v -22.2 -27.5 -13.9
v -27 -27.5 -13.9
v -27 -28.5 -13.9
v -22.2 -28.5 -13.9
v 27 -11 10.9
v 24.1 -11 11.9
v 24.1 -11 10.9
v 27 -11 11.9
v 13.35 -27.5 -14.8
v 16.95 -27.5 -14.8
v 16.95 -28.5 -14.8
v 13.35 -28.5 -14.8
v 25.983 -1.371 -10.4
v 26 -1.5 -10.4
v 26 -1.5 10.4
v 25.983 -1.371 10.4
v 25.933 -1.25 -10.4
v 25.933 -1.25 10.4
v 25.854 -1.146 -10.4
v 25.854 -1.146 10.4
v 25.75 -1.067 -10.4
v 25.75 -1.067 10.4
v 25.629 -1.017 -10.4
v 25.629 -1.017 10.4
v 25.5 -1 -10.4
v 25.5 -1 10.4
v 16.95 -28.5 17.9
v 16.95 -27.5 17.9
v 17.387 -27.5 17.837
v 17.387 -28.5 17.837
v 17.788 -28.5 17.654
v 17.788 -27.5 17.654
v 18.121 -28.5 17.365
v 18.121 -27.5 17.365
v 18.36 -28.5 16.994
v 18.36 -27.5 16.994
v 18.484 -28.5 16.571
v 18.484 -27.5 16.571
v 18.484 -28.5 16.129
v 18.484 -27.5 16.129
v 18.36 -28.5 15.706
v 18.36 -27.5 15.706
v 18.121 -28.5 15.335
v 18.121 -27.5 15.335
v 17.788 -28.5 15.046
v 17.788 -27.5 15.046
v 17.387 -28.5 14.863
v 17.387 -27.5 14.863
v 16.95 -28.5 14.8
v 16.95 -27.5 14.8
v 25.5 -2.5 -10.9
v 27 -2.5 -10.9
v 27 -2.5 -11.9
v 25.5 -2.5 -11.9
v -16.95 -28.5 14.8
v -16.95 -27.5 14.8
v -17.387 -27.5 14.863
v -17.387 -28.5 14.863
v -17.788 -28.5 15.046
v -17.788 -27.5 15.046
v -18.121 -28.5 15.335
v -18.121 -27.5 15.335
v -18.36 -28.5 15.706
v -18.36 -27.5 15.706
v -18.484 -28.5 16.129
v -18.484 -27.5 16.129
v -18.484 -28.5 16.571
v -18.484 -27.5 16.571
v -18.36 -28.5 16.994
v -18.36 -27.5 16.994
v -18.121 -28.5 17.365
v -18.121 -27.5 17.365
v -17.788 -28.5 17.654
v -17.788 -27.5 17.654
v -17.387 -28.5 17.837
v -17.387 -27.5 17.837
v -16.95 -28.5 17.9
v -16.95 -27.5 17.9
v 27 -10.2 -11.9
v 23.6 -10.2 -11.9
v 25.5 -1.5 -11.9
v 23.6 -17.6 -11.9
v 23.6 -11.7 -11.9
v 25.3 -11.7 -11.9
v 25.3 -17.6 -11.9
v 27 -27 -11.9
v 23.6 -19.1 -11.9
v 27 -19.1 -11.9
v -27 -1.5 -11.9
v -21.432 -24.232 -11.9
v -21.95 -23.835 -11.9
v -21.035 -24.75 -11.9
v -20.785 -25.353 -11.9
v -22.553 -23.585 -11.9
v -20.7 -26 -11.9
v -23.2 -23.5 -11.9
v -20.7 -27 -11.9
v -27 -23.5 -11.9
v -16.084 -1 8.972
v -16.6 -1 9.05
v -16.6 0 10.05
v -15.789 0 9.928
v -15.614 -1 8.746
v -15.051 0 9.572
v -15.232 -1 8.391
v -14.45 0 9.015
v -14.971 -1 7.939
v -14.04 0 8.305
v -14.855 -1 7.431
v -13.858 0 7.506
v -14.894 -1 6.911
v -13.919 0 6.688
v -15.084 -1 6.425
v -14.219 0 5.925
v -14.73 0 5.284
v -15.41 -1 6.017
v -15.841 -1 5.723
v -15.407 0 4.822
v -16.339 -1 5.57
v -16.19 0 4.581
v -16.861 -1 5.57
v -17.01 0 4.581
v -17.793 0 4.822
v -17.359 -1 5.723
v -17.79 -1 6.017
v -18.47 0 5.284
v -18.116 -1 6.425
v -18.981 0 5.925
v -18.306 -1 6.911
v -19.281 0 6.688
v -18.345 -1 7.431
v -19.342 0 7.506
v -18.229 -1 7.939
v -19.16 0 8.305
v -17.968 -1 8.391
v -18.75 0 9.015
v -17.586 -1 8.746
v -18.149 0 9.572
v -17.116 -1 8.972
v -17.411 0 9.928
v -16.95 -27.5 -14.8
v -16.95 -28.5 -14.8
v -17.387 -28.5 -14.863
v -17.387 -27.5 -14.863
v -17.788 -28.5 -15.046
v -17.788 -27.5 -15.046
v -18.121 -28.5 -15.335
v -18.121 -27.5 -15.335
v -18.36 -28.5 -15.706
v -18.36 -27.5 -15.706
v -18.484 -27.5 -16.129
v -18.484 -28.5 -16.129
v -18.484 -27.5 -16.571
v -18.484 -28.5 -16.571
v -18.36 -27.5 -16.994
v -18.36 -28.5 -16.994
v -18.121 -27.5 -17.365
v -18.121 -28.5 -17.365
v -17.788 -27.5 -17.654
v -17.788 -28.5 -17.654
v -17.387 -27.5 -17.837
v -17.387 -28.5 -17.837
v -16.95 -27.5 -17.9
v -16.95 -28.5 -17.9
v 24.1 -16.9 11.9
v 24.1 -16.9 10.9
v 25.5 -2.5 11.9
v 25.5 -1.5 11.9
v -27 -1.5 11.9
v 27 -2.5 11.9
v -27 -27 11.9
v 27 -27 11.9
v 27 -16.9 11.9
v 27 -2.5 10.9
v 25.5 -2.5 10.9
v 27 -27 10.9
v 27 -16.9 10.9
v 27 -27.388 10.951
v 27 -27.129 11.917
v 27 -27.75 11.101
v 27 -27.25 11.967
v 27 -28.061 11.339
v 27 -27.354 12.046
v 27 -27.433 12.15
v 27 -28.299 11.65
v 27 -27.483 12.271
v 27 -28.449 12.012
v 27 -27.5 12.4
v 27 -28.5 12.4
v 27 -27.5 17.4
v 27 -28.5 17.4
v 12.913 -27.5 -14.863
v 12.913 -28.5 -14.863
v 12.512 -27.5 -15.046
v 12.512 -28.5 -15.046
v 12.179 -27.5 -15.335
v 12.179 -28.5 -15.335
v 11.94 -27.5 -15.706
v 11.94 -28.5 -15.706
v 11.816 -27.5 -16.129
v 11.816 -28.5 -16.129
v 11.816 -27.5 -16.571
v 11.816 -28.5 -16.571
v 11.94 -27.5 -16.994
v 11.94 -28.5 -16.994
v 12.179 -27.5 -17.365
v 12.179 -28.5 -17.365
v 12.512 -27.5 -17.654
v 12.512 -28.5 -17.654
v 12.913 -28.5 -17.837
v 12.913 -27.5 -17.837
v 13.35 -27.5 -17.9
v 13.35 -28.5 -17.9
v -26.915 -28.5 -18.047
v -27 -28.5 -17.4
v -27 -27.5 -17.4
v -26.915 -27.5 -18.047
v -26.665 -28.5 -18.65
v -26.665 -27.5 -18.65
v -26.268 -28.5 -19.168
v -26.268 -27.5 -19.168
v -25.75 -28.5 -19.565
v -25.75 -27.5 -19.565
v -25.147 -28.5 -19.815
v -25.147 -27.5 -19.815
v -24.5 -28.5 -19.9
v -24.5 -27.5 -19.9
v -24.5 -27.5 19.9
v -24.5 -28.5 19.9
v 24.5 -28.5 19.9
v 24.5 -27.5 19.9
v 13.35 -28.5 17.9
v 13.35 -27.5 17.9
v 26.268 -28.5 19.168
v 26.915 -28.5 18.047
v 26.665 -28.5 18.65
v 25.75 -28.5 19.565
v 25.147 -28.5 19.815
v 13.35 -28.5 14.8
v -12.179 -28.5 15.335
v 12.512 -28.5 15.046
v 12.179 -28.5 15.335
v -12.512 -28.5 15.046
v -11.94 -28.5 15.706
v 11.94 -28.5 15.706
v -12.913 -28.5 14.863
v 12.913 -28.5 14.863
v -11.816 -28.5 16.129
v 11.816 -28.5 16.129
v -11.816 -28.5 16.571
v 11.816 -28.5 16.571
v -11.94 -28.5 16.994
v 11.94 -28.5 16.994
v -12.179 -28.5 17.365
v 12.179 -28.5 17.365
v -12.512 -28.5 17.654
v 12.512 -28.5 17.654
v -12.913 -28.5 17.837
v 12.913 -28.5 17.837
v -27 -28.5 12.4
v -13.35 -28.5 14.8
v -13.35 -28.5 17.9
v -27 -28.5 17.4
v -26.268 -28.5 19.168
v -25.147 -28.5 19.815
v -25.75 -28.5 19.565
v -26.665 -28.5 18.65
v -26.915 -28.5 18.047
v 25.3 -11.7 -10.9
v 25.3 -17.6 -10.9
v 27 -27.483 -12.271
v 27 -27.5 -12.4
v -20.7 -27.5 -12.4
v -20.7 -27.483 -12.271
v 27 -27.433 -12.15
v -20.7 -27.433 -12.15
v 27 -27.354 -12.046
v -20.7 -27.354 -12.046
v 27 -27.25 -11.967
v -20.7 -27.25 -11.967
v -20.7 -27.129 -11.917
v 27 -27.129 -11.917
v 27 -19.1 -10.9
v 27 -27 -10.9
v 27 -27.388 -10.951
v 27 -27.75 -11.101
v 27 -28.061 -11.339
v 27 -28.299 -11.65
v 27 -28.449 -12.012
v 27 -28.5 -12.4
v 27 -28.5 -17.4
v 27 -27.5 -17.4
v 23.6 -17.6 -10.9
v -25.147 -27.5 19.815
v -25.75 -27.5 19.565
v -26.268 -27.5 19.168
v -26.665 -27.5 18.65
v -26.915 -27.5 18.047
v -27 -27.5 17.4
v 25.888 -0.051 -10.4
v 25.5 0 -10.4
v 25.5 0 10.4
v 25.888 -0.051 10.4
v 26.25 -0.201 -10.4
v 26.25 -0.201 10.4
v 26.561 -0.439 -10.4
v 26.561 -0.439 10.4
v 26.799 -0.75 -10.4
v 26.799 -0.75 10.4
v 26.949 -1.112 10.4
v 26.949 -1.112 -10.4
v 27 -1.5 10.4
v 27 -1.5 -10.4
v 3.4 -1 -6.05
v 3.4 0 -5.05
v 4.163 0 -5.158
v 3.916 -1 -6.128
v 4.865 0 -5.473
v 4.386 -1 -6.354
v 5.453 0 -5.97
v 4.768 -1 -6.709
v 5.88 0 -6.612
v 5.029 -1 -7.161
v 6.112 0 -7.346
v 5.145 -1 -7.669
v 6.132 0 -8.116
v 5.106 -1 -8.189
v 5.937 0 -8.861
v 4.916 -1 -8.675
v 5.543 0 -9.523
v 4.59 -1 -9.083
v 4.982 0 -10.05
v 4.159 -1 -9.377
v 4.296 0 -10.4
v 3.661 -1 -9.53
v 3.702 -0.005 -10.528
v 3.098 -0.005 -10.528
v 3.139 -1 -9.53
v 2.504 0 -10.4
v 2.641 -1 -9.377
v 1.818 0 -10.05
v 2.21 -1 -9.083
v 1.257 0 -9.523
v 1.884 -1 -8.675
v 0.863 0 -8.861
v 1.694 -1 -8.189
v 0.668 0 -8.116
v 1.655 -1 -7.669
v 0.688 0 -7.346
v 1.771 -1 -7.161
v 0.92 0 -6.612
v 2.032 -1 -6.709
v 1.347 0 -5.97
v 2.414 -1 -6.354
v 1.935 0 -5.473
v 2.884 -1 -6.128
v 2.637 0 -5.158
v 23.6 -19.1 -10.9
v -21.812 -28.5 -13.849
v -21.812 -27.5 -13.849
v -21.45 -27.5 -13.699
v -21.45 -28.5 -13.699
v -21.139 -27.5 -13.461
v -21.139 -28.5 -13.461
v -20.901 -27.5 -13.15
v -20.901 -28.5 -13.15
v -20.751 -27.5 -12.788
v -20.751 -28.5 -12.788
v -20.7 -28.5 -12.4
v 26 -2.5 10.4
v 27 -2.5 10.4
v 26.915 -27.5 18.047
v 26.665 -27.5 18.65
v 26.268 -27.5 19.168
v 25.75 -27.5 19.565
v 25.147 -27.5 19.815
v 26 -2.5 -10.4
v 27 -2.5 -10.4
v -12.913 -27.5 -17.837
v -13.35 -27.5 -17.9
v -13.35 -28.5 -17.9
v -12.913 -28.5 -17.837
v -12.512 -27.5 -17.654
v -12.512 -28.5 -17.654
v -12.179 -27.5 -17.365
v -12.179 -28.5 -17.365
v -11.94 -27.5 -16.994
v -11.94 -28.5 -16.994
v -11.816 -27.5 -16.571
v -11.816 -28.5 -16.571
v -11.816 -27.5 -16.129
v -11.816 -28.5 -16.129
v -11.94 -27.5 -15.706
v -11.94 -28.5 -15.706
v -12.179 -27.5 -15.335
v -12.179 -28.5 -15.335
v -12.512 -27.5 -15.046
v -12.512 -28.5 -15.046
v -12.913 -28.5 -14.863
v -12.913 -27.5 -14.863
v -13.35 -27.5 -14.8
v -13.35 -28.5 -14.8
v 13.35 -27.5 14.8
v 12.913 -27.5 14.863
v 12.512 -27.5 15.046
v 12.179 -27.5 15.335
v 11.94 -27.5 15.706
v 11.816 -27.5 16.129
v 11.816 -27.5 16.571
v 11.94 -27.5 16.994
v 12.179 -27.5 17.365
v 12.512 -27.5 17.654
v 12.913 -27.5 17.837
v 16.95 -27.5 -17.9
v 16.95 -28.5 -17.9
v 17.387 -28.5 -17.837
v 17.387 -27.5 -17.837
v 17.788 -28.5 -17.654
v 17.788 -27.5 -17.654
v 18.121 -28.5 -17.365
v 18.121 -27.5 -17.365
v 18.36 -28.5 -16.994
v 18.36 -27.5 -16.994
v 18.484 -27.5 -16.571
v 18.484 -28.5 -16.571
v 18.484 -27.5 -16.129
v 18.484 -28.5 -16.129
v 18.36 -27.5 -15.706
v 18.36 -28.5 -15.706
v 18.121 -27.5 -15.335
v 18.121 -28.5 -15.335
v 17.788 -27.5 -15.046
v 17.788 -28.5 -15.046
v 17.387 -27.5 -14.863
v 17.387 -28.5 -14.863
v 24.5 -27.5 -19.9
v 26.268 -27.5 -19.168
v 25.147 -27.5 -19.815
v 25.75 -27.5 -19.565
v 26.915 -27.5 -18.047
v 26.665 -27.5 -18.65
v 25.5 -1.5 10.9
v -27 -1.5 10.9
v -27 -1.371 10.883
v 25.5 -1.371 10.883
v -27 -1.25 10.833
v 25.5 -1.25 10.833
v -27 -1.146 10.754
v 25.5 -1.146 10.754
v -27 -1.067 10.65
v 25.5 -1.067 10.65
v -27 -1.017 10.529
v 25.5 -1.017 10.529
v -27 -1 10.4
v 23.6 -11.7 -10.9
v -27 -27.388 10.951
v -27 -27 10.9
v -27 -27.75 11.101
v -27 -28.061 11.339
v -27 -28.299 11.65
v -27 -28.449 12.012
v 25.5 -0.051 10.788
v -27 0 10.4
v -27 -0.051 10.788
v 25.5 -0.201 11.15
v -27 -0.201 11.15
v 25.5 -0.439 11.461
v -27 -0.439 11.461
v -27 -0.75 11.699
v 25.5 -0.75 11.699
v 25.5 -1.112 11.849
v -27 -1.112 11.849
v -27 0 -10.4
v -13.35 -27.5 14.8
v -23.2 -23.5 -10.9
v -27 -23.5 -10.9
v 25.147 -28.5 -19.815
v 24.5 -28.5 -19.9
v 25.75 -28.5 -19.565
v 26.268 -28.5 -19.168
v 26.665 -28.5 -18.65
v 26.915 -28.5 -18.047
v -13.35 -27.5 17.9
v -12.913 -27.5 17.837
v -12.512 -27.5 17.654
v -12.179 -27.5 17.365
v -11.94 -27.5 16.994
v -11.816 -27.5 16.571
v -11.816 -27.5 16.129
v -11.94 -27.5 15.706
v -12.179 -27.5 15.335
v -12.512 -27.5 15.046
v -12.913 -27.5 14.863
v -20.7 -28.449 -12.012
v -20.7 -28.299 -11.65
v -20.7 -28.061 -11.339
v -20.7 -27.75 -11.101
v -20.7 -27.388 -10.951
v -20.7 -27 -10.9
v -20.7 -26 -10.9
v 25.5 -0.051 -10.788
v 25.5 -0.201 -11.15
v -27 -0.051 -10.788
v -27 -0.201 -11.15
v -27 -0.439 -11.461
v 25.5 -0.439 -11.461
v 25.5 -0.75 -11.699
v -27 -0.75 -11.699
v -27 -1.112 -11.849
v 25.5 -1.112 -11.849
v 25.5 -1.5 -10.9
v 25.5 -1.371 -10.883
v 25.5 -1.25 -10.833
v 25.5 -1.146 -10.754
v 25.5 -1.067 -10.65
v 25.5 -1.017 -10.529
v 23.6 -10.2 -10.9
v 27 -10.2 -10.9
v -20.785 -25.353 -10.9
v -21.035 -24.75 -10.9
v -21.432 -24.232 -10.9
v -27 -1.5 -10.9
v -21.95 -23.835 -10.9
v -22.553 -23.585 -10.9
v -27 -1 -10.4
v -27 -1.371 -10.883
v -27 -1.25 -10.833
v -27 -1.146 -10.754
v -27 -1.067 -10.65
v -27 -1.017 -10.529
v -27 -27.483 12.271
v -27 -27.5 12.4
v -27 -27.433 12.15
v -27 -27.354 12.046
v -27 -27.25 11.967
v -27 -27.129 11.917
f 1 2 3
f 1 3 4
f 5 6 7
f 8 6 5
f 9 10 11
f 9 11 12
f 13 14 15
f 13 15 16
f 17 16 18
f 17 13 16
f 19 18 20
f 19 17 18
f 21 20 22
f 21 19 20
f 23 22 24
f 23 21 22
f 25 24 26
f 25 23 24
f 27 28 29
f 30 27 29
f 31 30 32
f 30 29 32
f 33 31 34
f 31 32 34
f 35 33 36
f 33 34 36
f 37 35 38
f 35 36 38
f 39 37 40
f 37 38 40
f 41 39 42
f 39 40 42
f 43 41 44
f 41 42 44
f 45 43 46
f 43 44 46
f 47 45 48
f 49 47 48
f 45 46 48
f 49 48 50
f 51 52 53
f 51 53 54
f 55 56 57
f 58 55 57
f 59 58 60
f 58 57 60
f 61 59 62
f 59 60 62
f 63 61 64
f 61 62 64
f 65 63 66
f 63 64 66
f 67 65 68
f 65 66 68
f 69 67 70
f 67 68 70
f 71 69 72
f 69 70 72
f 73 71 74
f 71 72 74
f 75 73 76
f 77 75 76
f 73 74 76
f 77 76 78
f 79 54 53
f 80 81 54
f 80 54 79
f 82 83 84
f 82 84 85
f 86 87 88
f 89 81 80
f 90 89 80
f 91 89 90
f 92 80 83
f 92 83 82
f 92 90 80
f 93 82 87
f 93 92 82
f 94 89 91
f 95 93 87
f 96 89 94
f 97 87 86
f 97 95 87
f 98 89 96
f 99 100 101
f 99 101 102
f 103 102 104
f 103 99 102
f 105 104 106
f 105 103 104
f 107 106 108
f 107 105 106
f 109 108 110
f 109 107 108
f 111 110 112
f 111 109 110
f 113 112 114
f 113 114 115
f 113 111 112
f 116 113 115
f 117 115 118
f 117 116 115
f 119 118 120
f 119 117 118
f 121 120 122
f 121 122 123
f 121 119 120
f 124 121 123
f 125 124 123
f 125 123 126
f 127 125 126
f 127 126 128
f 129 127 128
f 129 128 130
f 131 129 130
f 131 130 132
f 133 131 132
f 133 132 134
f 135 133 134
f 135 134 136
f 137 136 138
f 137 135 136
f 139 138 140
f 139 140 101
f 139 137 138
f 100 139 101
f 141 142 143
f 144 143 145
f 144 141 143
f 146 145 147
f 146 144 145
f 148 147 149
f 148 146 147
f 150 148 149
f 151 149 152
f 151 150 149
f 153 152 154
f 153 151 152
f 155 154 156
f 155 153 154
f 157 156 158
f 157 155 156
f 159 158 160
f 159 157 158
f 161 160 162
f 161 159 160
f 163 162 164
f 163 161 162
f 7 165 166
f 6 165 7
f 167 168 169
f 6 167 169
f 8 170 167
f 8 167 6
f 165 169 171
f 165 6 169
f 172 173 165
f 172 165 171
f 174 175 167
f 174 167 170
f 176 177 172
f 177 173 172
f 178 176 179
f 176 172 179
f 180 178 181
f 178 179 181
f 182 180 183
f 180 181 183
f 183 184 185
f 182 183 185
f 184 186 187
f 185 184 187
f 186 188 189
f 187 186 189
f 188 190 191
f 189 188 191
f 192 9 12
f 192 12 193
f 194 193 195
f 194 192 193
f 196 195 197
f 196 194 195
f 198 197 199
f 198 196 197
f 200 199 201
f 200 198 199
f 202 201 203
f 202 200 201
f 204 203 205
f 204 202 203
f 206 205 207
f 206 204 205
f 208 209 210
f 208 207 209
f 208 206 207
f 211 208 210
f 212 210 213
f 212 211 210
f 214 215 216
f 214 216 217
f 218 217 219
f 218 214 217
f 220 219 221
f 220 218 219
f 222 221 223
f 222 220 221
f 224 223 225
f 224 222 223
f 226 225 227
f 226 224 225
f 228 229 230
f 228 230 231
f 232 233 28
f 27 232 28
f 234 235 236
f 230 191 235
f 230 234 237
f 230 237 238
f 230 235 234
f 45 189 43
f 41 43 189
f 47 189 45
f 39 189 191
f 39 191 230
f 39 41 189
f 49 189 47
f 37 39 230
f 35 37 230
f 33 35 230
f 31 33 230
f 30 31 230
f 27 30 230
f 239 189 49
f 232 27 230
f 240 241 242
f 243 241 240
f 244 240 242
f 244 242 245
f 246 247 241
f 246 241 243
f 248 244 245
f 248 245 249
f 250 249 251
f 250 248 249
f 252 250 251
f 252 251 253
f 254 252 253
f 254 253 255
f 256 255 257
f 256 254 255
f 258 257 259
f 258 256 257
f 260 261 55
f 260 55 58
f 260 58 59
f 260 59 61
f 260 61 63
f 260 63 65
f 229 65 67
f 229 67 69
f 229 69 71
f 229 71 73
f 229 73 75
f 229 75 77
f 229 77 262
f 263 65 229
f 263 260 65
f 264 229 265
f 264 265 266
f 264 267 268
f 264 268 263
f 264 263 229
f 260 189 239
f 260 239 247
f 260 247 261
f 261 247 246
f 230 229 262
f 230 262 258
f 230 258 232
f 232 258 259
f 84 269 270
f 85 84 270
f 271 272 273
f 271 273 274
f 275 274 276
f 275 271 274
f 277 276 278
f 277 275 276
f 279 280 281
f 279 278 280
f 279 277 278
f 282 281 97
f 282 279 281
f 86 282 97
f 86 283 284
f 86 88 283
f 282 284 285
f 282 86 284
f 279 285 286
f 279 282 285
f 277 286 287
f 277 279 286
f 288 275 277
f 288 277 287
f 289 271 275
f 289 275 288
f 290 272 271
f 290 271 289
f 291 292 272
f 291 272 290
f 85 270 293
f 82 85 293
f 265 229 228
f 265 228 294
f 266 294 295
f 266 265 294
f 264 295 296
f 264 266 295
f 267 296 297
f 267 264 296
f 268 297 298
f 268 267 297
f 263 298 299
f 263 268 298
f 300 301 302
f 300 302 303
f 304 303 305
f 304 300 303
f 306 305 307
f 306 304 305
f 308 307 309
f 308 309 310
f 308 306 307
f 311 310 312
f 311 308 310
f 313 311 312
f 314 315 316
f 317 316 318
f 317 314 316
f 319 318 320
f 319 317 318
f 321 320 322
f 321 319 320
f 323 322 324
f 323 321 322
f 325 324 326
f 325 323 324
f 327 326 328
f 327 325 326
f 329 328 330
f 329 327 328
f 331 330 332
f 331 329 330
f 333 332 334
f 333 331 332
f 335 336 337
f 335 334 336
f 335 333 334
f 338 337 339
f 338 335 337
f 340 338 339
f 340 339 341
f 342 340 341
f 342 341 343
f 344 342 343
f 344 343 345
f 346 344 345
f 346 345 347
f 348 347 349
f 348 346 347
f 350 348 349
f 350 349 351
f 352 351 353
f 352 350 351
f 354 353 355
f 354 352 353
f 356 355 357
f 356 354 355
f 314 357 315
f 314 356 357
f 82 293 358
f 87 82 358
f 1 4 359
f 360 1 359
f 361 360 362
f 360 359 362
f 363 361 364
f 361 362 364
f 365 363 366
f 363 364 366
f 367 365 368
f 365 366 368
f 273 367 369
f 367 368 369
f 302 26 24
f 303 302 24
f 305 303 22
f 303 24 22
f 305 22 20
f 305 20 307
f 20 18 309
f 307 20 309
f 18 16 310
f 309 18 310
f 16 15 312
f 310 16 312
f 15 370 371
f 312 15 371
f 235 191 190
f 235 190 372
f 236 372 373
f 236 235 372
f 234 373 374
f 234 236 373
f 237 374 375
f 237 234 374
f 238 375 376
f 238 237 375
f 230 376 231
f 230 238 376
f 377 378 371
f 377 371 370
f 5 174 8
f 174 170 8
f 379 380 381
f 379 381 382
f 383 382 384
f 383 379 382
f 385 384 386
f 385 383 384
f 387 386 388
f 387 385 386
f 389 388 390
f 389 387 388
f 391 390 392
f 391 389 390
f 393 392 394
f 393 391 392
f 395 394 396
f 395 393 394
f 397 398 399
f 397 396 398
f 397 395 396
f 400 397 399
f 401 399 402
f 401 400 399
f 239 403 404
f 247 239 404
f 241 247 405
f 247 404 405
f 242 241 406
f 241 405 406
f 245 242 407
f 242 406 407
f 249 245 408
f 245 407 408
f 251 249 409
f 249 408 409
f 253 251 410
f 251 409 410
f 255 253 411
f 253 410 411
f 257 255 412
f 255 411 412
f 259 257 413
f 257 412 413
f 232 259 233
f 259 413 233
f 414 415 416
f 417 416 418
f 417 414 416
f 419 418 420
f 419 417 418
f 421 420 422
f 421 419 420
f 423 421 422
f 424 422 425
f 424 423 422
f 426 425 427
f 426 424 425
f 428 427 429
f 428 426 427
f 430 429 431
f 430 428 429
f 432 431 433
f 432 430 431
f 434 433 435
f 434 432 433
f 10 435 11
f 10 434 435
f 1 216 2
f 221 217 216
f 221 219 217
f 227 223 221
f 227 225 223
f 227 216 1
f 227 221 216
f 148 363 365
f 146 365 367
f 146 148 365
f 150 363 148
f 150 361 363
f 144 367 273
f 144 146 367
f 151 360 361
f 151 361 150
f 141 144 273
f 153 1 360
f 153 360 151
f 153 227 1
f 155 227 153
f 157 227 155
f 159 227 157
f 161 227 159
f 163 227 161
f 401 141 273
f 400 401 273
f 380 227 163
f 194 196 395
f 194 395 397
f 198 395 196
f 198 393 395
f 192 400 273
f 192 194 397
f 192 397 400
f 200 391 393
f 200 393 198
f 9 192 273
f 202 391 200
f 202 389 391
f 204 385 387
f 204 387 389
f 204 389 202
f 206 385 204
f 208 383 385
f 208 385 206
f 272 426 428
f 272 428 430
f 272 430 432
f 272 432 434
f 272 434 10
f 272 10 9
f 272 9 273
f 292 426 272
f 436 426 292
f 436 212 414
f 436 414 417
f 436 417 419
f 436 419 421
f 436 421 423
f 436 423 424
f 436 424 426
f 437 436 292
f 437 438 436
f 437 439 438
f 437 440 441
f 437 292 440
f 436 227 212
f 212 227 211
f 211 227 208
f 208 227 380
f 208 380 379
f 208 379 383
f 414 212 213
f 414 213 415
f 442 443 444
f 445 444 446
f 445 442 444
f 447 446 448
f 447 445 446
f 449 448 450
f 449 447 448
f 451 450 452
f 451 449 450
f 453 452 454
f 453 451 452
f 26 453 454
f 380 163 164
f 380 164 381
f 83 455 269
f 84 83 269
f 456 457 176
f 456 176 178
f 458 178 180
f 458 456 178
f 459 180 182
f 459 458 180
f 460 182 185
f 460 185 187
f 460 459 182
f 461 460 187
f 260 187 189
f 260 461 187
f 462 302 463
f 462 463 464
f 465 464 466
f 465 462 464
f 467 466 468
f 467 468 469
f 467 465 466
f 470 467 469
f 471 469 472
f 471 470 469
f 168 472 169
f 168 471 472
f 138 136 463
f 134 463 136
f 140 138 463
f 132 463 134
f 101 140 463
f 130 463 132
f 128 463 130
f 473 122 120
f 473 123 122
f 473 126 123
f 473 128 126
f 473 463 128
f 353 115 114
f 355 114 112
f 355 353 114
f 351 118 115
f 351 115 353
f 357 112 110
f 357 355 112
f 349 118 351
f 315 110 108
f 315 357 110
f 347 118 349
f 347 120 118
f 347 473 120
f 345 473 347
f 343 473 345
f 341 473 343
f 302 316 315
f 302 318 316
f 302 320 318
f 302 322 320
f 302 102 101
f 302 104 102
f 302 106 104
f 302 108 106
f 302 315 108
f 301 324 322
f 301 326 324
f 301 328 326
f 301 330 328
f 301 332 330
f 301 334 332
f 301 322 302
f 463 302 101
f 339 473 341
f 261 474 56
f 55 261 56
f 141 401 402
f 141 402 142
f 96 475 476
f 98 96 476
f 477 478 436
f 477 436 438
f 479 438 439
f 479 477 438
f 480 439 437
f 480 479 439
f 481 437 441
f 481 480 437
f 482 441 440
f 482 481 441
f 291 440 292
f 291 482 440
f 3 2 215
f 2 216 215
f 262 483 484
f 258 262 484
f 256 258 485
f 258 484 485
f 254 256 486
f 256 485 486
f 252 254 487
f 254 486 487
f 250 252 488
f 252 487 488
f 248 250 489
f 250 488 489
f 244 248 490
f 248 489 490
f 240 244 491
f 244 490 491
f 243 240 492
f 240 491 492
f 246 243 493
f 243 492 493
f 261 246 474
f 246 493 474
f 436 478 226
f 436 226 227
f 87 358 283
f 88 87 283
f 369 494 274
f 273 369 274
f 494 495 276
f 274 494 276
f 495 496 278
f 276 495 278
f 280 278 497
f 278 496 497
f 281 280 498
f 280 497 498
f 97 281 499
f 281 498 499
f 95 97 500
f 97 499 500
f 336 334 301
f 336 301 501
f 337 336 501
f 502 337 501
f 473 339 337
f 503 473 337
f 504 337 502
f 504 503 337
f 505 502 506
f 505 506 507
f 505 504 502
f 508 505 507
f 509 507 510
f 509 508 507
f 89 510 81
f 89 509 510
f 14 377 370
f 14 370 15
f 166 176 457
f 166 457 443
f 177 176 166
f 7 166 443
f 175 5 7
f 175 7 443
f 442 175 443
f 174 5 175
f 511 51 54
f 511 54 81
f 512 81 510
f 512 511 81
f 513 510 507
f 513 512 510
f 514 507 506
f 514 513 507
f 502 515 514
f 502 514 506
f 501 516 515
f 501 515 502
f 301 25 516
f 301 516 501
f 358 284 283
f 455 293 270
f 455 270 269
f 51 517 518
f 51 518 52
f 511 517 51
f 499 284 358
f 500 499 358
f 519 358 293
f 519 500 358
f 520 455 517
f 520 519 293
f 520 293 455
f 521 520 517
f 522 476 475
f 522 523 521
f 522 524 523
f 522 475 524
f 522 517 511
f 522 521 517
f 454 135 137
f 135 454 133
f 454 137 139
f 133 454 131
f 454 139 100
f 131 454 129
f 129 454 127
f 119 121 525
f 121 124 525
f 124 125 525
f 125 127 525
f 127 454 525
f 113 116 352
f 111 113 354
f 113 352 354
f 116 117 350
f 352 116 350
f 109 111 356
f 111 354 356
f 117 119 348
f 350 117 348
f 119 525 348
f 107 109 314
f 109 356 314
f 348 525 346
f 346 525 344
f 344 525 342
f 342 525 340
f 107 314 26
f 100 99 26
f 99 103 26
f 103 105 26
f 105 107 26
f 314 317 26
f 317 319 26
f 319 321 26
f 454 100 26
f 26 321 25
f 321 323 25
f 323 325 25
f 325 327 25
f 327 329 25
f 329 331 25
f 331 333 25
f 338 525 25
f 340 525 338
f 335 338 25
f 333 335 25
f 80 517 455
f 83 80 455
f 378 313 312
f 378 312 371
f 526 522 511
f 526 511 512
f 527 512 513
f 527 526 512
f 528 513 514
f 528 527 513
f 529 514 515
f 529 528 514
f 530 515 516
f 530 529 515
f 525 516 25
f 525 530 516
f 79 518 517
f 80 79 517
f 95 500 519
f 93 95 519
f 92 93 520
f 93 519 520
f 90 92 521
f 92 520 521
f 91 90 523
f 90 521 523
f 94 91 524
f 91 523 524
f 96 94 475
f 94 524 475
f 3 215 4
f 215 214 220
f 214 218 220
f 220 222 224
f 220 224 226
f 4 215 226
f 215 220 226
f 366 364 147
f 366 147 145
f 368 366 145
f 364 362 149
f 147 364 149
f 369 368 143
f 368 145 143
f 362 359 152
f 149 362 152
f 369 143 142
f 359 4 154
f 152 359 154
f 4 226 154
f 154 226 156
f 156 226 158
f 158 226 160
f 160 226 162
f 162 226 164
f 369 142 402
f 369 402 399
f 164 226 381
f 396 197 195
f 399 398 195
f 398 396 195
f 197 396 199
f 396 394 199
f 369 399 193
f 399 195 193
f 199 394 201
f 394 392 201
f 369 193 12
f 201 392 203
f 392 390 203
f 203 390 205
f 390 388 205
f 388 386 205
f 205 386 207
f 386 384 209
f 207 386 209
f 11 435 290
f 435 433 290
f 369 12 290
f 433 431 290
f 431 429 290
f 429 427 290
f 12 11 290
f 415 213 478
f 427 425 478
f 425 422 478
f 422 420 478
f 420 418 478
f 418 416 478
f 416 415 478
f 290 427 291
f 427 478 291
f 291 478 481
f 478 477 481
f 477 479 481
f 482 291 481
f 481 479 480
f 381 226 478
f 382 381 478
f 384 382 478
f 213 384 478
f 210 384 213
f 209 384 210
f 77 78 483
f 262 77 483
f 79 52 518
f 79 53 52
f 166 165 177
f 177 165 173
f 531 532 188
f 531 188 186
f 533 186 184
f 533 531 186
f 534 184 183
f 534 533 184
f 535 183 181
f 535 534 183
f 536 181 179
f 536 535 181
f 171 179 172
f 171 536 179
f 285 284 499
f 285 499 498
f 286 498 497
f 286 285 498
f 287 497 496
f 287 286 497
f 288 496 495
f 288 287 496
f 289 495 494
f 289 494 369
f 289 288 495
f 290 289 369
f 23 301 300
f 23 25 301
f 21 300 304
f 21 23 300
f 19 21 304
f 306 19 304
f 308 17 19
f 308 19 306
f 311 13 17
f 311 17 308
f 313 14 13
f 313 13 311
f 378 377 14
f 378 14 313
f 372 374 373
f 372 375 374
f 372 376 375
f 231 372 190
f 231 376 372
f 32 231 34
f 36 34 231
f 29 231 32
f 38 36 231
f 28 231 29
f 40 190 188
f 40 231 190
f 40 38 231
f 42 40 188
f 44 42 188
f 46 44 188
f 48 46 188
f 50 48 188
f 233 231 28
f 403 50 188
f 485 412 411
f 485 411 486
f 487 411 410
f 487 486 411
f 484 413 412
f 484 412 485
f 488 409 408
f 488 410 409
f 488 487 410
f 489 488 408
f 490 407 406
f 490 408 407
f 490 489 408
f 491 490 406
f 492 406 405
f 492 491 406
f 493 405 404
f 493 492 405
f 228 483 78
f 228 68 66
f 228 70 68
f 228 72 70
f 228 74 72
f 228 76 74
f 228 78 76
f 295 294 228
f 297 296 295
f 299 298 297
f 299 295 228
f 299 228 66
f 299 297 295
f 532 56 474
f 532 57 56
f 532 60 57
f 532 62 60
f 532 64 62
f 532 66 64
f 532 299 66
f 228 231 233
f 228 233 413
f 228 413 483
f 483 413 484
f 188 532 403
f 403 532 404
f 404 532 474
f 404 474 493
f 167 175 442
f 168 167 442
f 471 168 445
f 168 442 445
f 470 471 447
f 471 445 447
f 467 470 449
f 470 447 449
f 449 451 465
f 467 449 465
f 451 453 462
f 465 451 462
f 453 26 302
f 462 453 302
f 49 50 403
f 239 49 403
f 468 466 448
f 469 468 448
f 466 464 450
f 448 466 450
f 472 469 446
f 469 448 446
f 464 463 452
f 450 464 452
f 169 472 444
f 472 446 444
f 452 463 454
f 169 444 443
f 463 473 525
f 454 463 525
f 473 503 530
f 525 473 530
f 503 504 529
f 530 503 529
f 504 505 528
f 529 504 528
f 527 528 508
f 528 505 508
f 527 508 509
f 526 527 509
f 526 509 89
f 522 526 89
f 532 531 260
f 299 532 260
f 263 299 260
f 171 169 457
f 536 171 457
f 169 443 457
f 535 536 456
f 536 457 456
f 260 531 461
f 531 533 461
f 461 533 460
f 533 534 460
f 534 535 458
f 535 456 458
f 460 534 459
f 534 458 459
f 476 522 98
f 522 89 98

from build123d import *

# Parameters (mm, degrees)
SKETCH1_W                      = 54
SKETCH1_H                      = 23.8
BASE_FLANGE1_DEPTH             = 1
EDGE_FLANGE1_STRIP_W           = 5
EDGE_FLANGE1_STRIP_H           = 1
EDGE_FLANGE1_STRIP_CUT_DEPTH   = 54
EDGE_FLANGE1_STRIP_2_W         = 5
EDGE_FLANGE1_STRIP_2_H         = 1
EDGE_FLANGE1_STRIP_CUT_2_DEPTH = 54
EDGE_FLANGE1_DEPTH             = 54
EDGE_FLANGE1_BEND_DEPTH        = 54
EDGE_FLANGE2_STRIP_W           = 5
EDGE_FLANGE2_STRIP_H           = 1
EDGE_FLANGE2_STRIP_CUT_DEPTH   = 20.8
EDGE_FLANGE2_DEPTH             = 20.8
CUT_EXTRUDE1_START             = -1.5
CUT_EXTRUDE1_DEPTH             = 1.5
CUT_EXTRUDE2_START             = -1.5
CUT_EXTRUDE2_DEPTH             = 1.5
EDGE_FLANGE3_STRIP_W           = 5
EDGE_FLANGE3_STRIP_H           = 1
EDGE_FLANGE3_STRIP_CUT_DEPTH   = 54
EDGE_FLANGE3_STRIP_2_W         = 5
EDGE_FLANGE3_STRIP_2_H         = 1
EDGE_FLANGE3_STRIP_CUT_2_DEPTH = 54
EDGE_FLANGE3_DEPTH             = 54
EDGE_FLANGE3_BEND_DEPTH        = 54
BREAK_CORNER1_START            = -28.5
BREAK_CORNER1_DEPTH            = 1
CUT_EXTRUDE3_DEPTH             = 10
CUT_EXTRUDE4_DEPTH             = 2
CUT_EXTRUDE4_DEPTH_BACK        = 2
BREAK_CORNER2_START            = -28.5
BREAK_CORNER2_DEPTH            = 1
CUT_EXTRUDE5_DEPTH             = 1
SKETCH26_W                     = 2.9
SKETCH26_H                     = 5.9
CUT_EXTRUDE6_DEPTH             = 1
SKETCH27_R                     = 1.6
CUT_EXTRUDE7_DEPTH             = 1
MOVE_FACE1_BY                  = 0.15
MOVE_FACE1_2_BY                = 0.15
CHAMFER1_SIZE                  = 1
CHAMFER2_SIZE                  = 1


# Read off the part's stored shape, not the designer's step: Break-Corner1, Break-Corner2
# Sheet-metal steps are written as plain solids
# Some blends are built 0.0001 mm under size
with BuildPart() as part:
    # Sketch1 → Base-Flange1 (new body)
    with BuildSketch(Plane(origin=(0, 0, 0), x_dir=(1, 0, 0), z_dir=(0, 1, 0))):
        Rectangle(SKETCH1_W, SKETCH1_H)
    extrude(amount=-BASE_FLANGE1_DEPTH)

    # Edge-Flange1 strip (across the edge) → Edge-Flange1 strip cut (cut)
    with BuildSketch(Plane(origin=(27, -1, 11.9), x_dir=(0, 0, -1), z_dir=(-1, 0, 0))):
        with Locations((-1, -0.5)):
            Rectangle(EDGE_FLANGE1_STRIP_W, EDGE_FLANGE1_STRIP_H)
    extrude(amount=EDGE_FLANGE1_STRIP_CUT_DEPTH, mode=Mode.SUBTRACT)

    # Edge-Flange1 strip 2 (across the edge) → Edge-Flange1 strip cut 2 (cut)
    with BuildSketch(Plane(origin=(-27, -1, -11.9), x_dir=(0, 0, 1), z_dir=(1, 0, 0))):
        with Locations((-1, -0.5)):
            Rectangle(EDGE_FLANGE1_STRIP_2_W, EDGE_FLANGE1_STRIP_2_H)
    extrude(amount=EDGE_FLANGE1_STRIP_CUT_2_DEPTH, mode=Mode.SUBTRACT)

    # Edge-Flange1 section (across the edge) → Edge-Flange1 (add)
    with BuildSketch(Plane(origin=(27, -1, 11.9), x_dir=(0, 0, -1), z_dir=(-1, 0, 0))):
        with BuildLine():
            Line((0, 0.5), (0, 27.5))
            Line((0, 27.5), (1, 27.5))
            Line((1, 27.5), (1, 0.5))
            ThreePointArc((1, 0.5), (1.146446609, 0.146446609), (1.5, 0))
            Line((1.5, 0), (1.5, -1))
            ThreePointArc((1.5, -1), (0.439339828, -0.560660172), (0, 0.5))
        make_face()
    extrude(amount=EDGE_FLANGE1_DEPTH)

    # Edge-Flange1 section 2 (across the edge) → Edge-Flange1 bend (add)
    with BuildSketch(Plane(origin=(-27, -1, -11.9), x_dir=(0, 0, 1), z_dir=(1, 0, 0))):
        with BuildLine():
            Line((0, 0.5), (0, 27.5))
            Line((0, 27.5), (1, 27.5))
            Line((1, 27.5), (1, 0.5))
            ThreePointArc((1, 0.5), (1.146446609, 0.146446609), (1.5, 0))
            Line((1.5, 0), (1.5, -1))
            ThreePointArc((1.5, -1), (0.439339828, -0.560660172), (0, 0.5))
        make_face()
    extrude(amount=EDGE_FLANGE1_BEND_DEPTH)

    # Edge-Flange2 strip (across the edge) → Edge-Flange2 strip cut (cut)
    with BuildSketch(Plane(origin=(27, -1, -10.4), x_dir=(-1, 0, 0), z_dir=(0, 0, 1))):
        with Locations((-1, -0.5)):
            Rectangle(EDGE_FLANGE2_STRIP_W, EDGE_FLANGE2_STRIP_H)
    extrude(amount=EDGE_FLANGE2_STRIP_CUT_DEPTH, mode=Mode.SUBTRACT)

    # Edge-Flange2 section (across the edge) → Edge-Flange2 (add)
    with BuildSketch(Plane(origin=(27, -1, -10.4), x_dir=(-1, 0, 0), z_dir=(0, 0, 1))):
        with BuildLine():
            Line((0, 0.5), (0, 1.5))
            Line((0, 1.5), (1, 1.5))
            Line((1, 1.5), (1, 0.5))
            ThreePointArc((1, 0.5), (1.146446609, 0.146446609), (1.5, 0))
            Line((1.5, 0), (1.5, -1))
            ThreePointArc((1.5, -1), (0.439339828, -0.560660172), (0, 0.5))
        make_face()
    extrude(amount=EDGE_FLANGE2_DEPTH)

    # Sketch15 → Cut-Extrude1 (cut)
    with BuildSketch(Plane(origin=(0, 0, -11.9), x_dir=(-1, 0, 0), z_dir=(0, 0, -1)).offset(CUT_EXTRUDE1_START)):
        Polygon((-27, -2.5), (-25.5, -2.5), (-25.5, 0), (-28.102393481, 0), (-28.102393481, -2.5), align=None)
    extrude(amount=CUT_EXTRUDE1_DEPTH, mode=Mode.SUBTRACT)

    # Sketch16 → Cut-Extrude2 (cut)
    with BuildSketch(Plane.XY.offset(11.9).offset(CUT_EXTRUDE2_START)):
        Polygon((25.5, -2.5), (25.5, 0), (28.102393481, 0), (28.102393481, -2.5), (27, -2.5), align=None)
    extrude(amount=CUT_EXTRUDE2_DEPTH, mode=Mode.SUBTRACT)

    # Edge-Flange3 strip (across the edge) → Edge-Flange3 strip cut (cut)
    with BuildSketch(Plane(origin=(-27, -28.5, 11.9), x_dir=(0, 1, 0), z_dir=(1, 0, 0))):
        with Locations((-1, -0.5)):
            Rectangle(EDGE_FLANGE3_STRIP_W, EDGE_FLANGE3_STRIP_H)
    extrude(amount=EDGE_FLANGE3_STRIP_CUT_DEPTH, mode=Mode.SUBTRACT)

    # Edge-Flange3 strip 2 (across the edge) → Edge-Flange3 strip cut 2 (cut)
    with BuildSketch(Plane(origin=(27, -28.5, -11.9), x_dir=(0, 1, 0), z_dir=(-1, 0, 0))):
        with Locations((-1, -0.5)):
            Rectangle(EDGE_FLANGE3_STRIP_2_W, EDGE_FLANGE3_STRIP_2_H)
    extrude(amount=EDGE_FLANGE3_STRIP_CUT_2_DEPTH, mode=Mode.SUBTRACT)

    # Edge-Flange3 section (across the edge) → Edge-Flange3 (add)
    with BuildSketch(Plane(origin=(-27, -28.5, 11.9), x_dir=(0, 1, 0), z_dir=(1, 0, 0))):
        with BuildLine():
            Line((0, 0.5), (0, 8))
            Line((0, 8), (1, 8))
            Line((1, 8), (1, 0.5))
            ThreePointArc((1, 0.5), (1.146446609, 0.146446609), (1.5, 0))
            Line((1.5, 0), (1.5, -1))
            ThreePointArc((1.5, -1), (0.439339828, -0.560660172), (0, 0.5))
        make_face()
    extrude(amount=EDGE_FLANGE3_DEPTH)

    # Edge-Flange3 section 2 (across the edge) → Edge-Flange3 bend (add)
    with BuildSketch(Plane(origin=(27, -28.5, -11.9), x_dir=(0, 1, 0), z_dir=(-1, 0, 0))):
        with BuildLine():
            Line((0, 0.5), (0, 8))
            Line((0, 8), (1, 8))
            Line((1, 8), (1, 0.5))
            ThreePointArc((1, 0.5), (1.146446609, 0.146446609), (1.5, 0))
            Line((1.5, 0), (1.5, -1))
            ThreePointArc((1.5, -1), (0.439339828, -0.560660172), (0, 0.5))
        make_face()
    extrude(amount=EDGE_FLANGE3_BEND_DEPTH)

    # Break-Corner1 outline → Break-Corner1 (cut)
    with BuildSketch(Plane(origin=(0, 0, 0), x_dir=(1, 0, 0), z_dir=(0, 1, 0)).offset(BREAK_CORNER1_START)):
        with BuildLine():
            Line((-27, -19.9), (-24.5, -19.9))
            ThreePointArc((-24.5, -19.9), (-26.267766953, -19.167766953), (-27, -17.4))
            Line((-27, -17.4), (-27, -19.9))
        make_face()
        with BuildLine():
            ThreePointArc((27, -17.4), (26.267766953, -19.167766953), (24.5, -19.9))
            Line((24.5, -19.9), (27, -19.9))
            Line((27, -19.9), (27, -17.4))
        make_face()
        with BuildLine():
            Line((27, 19.9), (24.5, 19.9))
            ThreePointArc((24.5, 19.9), (26.267766953, 19.167766953), (27, 17.4))
            Line((27, 17.4), (27, 19.9))
        make_face()
        with BuildLine():
            ThreePointArc((-27, 17.4), (-26.267766953, 19.167766953), (-24.5, 19.9))
            Line((-24.5, 19.9), (-27, 19.9))
            Line((-27, 19.9), (-27, 17.4))
        make_face()
    extrude(amount=BREAK_CORNER1_DEPTH, mode=Mode.SUBTRACT)

    # Sketch23 → Cut-Extrude3 (cut)
    with BuildSketch(Plane(origin=(0, -27.5, 0), x_dir=(1, 0, 0), z_dir=(0, 1, 0))):
        with BuildLine():
            Line((13.35, 17.9), (16.95, 17.9))
            ThreePointArc((16.95, 17.9), (18.5, 16.35), (16.95, 14.8))
            Line((16.95, 14.8), (13.35, 14.8))
            ThreePointArc((13.35, 14.8), (11.8, 16.35), (13.35, 17.9))
        make_face()
        with BuildLine():
            Line((-13.35, 14.8), (-16.95, 14.8))
            ThreePointArc((-16.95, 14.8), (-18.5, 16.35), (-16.95, 17.9))
            Line((-16.95, 17.9), (-13.35, 17.9))
            ThreePointArc((-13.35, 17.9), (-11.8, 16.35), (-13.35, 14.8))
        make_face()
        with BuildLine():
            Line((13.35, -17.9), (16.95, -17.9))
            ThreePointArc((16.95, -17.9), (18.5, -16.35), (16.95, -14.8))
            Line((16.95, -14.8), (13.35, -14.8))
            ThreePointArc((13.35, -14.8), (11.8, -16.35), (13.35, -17.9))
        make_face()
        with BuildLine():
            Line((-13.35, -14.8), (-16.95, -14.8))
            ThreePointArc((-16.95, -14.8), (-18.5, -16.35), (-16.95, -17.9))
            Line((-16.95, -17.9), (-13.35, -17.9))
            ThreePointArc((-13.35, -17.9), (-11.8, -16.35), (-13.35, -14.8))
        make_face()
    extrude(amount=-CUT_EXTRUDE3_DEPTH, mode=Mode.SUBTRACT)

    # Sketch24 → Cut-Extrude4 (cut, two sides: drawn at the far end of the back side and taken through both)
    with BuildSketch(Plane(origin=(0, 0, -11.9), x_dir=(-1, 0, 0), z_dir=(0, 0, -1)).offset(-CUT_EXTRUDE4_DEPTH_BACK)):
        with BuildLine():
            Line((27, -28.5), (20.7, -28.5))
            Line((20.7, -28.5), (20.7, -26))
            ThreePointArc((20.7, -26), (21.432233047, -24.232233047), (23.2, -23.5))
            Line((23.2, -23.5), (27, -23.5))
            Line((27, -23.5), (27, -28.5))
        make_face()
    extrude(amount=CUT_EXTRUDE4_DEPTH + CUT_EXTRUDE4_DEPTH_BACK, mode=Mode.SUBTRACT)

    # Break-Corner2 outline → Break-Corner2 (add)
    with BuildSketch(Plane(origin=(0, 0, 0), x_dir=(1, 0, 0), z_dir=(0, 1, 0)).offset(BREAK_CORNER2_START)):
        with BuildLine():
            Line((-20.7, 13.9), (-22.2, 13.9))
            ThreePointArc((-22.2, 13.9), (-21.139339828, 13.460660172), (-20.7, 12.4))
            Line((-20.7, 12.4), (-20.7, 13.9))
        make_face()
    extrude(amount=BREAK_CORNER2_DEPTH)

    # Sketch25 → Cut-Extrude5 (cut)
    with BuildSketch(Plane.XY.offset(-10.9)):
        Polygon((27, -10.2), (23.6, -10.2), (23.6, -11.7), (25.3, -11.7), (25.3, -17.6), (23.6, -17.6), (23.6, -19.1), (27, -19.1), align=None)
    extrude(amount=-CUT_EXTRUDE5_DEPTH, mode=Mode.SUBTRACT)

    # Sketch26 → Cut-Extrude6 (cut)
    with BuildSketch(Plane.XY.offset(11.9)):
        with Locations((25.55, -13.95)):
            Rectangle(SKETCH26_W, SKETCH26_H)
    extrude(amount=-CUT_EXTRUDE6_DEPTH, mode=Mode.SUBTRACT)

    # Sketch27 → Cut-Extrude7 (cut)
    with BuildSketch(Plane(origin=(0, 0, 0), x_dir=(1, 0, 0), z_dir=(0, 1, 0))):
        with Locations(Location((-16.6, -7.3, 0), (0, 0, 270))):
            Circle(SKETCH27_R)
        with Locations(Location((3.4, 7.8, 0), (0, 0, 270))):
            Circle(SKETCH27_R)
    extrude(amount=-CUT_EXTRUDE7_DEPTH, mode=Mode.SUBTRACT)

    # Move Face1: a curved face moved inward by 0.15
    add(Solid.thicken(part.faces().sort_by_distance((3.4, -0.5, -9.4))[0], -MOVE_FACE1_BY), mode=Mode.SUBTRACT)

    # Move Face1 2: a curved face moved inward by 0.15
    add(Solid.thicken(part.faces().sort_by_distance((-16.6, -0.5, 5.7))[0], -MOVE_FACE1_2_BY), mode=Mode.SUBTRACT)

    # Chamfer1
    chamfer1_edges = [part.edges().sort_by_distance(p)[0] for p in [
        (-16.6, 0, 5.55),
    ]]
    chamfer(chamfer1_edges, length=CHAMFER1_SIZE - 0.0001)  # a hair under: the kernel refuses the full size

    # Chamfer2
    # the kernel refuses this chamfer: 1 mm, written as the material it takes off along each edge
    with BuildSketch(Plane(origin=(3.4, 0, -7.8), x_dir=(0, 0, 1), z_dir=(-1, 0, 0))) as chamfer2_piece_1:
        Polygon((1.75 + CHAMFER2_SIZE, 0), (1.75, -CHAMFER2_SIZE), (1.75, 0), align=None)
    revolve(axis=Axis((3.4, 0, -7.8), (0, 1, 0)), mode=Mode.SUBTRACT)


solid = part.part
